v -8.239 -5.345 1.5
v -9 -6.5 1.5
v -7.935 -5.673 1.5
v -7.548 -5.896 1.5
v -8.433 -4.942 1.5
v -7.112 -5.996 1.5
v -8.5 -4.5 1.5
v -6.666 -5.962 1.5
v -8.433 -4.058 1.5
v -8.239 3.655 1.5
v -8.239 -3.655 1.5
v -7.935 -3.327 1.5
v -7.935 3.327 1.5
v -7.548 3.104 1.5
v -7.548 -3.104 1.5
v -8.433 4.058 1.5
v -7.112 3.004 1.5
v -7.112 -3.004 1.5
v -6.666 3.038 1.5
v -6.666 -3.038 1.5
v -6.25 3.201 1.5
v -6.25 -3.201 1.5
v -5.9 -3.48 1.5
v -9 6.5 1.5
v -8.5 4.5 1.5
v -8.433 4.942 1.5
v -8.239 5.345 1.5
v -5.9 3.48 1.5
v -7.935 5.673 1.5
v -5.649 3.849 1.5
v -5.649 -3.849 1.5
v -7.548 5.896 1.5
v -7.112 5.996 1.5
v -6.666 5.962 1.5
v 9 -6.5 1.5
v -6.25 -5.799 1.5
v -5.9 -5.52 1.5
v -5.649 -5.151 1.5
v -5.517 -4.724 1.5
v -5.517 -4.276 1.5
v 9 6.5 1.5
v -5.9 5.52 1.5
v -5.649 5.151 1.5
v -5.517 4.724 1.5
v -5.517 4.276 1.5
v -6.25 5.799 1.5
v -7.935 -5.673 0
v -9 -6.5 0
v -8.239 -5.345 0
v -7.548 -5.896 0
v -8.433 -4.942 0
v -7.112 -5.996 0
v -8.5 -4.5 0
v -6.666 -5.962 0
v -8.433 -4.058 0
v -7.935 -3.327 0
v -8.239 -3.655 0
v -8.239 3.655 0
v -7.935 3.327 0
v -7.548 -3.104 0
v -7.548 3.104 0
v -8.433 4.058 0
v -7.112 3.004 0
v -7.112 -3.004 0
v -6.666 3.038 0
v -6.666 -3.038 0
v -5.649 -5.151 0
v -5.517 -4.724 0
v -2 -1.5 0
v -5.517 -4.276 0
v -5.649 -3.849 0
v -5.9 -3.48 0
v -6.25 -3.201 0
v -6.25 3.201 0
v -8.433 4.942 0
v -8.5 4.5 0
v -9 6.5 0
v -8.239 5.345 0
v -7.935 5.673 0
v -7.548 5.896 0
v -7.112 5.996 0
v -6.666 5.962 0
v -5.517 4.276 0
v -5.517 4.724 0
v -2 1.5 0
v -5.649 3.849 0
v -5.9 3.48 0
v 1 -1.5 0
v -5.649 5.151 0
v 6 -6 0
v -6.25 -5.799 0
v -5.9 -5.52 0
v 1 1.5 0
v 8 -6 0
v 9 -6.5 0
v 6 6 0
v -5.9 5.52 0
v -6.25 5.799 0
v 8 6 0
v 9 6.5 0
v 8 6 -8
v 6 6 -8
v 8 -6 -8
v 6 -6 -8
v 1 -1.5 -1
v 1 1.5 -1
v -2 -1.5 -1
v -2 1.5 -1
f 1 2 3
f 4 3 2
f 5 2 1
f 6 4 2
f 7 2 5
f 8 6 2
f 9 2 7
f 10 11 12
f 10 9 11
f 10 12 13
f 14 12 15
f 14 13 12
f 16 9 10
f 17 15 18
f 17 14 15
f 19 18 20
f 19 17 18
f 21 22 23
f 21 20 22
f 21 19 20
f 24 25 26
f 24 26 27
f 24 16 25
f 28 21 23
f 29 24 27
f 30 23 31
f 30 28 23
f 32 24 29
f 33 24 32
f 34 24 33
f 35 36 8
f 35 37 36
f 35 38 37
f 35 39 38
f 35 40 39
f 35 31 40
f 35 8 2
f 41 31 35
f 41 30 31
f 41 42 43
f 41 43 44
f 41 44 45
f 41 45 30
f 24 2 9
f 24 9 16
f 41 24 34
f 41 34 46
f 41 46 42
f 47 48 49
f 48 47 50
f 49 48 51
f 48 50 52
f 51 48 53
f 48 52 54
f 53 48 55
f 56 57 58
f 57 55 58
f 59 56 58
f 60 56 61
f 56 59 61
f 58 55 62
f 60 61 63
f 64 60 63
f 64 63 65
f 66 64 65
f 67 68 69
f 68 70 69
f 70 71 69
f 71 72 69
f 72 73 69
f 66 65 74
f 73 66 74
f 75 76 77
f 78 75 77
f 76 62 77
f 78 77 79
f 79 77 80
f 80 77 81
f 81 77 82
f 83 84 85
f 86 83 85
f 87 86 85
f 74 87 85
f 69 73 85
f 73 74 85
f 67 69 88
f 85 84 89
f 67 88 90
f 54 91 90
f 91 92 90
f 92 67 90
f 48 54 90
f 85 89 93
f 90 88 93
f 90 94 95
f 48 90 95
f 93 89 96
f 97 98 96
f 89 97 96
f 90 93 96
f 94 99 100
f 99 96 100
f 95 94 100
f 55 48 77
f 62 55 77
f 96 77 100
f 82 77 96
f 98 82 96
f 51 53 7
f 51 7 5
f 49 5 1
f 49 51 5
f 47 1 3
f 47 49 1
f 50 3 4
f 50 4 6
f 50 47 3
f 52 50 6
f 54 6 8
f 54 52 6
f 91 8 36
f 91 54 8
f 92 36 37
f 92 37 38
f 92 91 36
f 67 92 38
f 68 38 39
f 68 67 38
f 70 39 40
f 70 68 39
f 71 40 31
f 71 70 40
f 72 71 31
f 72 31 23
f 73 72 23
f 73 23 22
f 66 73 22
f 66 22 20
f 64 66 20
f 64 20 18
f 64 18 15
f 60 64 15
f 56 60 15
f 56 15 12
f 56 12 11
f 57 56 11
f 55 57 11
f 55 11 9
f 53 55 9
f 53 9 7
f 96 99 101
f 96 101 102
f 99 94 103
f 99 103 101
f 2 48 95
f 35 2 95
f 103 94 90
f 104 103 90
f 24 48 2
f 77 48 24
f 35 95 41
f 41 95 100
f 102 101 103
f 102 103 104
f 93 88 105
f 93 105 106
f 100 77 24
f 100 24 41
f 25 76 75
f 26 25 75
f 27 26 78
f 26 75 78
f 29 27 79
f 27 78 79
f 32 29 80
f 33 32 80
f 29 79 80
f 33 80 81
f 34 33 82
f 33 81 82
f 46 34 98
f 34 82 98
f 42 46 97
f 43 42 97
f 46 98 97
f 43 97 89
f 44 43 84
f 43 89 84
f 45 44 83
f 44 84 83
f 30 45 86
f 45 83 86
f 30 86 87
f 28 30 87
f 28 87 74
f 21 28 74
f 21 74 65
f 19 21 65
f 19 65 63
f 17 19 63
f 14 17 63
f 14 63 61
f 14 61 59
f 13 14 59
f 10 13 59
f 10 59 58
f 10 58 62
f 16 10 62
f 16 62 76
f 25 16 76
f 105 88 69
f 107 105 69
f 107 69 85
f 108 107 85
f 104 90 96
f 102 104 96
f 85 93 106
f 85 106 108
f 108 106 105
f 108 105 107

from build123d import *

# Parameters (mm, degrees)
ESQUISSE1_W             = 18
ESQUISSE1_H             = 13
BOSS_EXTRU_1_DEPTH      = 1.5
ENL_V_MAT_EXTRU_1_REACH = 13.203
ESQUISSE2_R             = 1.5
ESQUISSE3_W             = 2
ESQUISSE3_H             = 12
BOSS_EXTRU_2_DEPTH      = 8
ESQUISSE4_W             = 3
ESQUISSE4_H             = 3
BOSS_EXTRU_3_DEPTH      = 1


with BuildPart() as part:
    # Esquisse1 → Boss.-Extru.1 (new body)
    with BuildSketch(Plane.XY):
        Rectangle(ESQUISSE1_W, ESQUISSE1_H)
    extrude(amount=BOSS_EXTRU_1_DEPTH)

    # Esquisse2 → Enlèv. mat.-Extru.1 (cut, up to next)
    with BuildSketch(Plane(origin=(0, 0, 0), x_dir=(-1, 0, 0), z_dir=(0, 0, -1)), mode=Mode.PRIVATE) as enl_v_mat_extru_1_sk1:
        with Locations((7, 4.5)):
            Circle(ESQUISSE2_R)
    enl_v_mat_extru_1_tool1 = extrude(enl_v_mat_extru_1_sk1.sketch, amount=-ENL_V_MAT_EXTRU_1_REACH, mode=Mode.PRIVATE) & part.part
    enl_v_mat_extru_1 = enl_v_mat_extru_1_tool1.solids().sort_by_distance((-7, 4.5, 0))[0]
    add(enl_v_mat_extru_1, mode=Mode.SUBTRACT)

    # Symétrie1: Enlèv. mat.-Extru.1 across plane
    add(enl_v_mat_extru_1.mirror(Plane.ZX), mode=Mode.SUBTRACT)

    # Esquisse3 → Boss.-Extru.2 (add)
    with BuildSketch(Plane(origin=(0, 0, 0), x_dir=(-1, 0, 0), z_dir=(0, 0, -1))):
        with Locations((-7, 0)):
            Rectangle(ESQUISSE3_W, ESQUISSE3_H)
    extrude(amount=BOSS_EXTRU_2_DEPTH)

    # Esquisse4 → Boss.-Extru.3 (add)
    with BuildSketch(Plane(origin=(0, 0, 0), x_dir=(-1, 0, 0), z_dir=(0, 0, -1))):
        with Locations((0.5, 0)):
            Rectangle(ESQUISSE4_W, ESQUISSE4_H)
    extrude(amount=BOSS_EXTRU_3_DEPTH)


solid = part.part
